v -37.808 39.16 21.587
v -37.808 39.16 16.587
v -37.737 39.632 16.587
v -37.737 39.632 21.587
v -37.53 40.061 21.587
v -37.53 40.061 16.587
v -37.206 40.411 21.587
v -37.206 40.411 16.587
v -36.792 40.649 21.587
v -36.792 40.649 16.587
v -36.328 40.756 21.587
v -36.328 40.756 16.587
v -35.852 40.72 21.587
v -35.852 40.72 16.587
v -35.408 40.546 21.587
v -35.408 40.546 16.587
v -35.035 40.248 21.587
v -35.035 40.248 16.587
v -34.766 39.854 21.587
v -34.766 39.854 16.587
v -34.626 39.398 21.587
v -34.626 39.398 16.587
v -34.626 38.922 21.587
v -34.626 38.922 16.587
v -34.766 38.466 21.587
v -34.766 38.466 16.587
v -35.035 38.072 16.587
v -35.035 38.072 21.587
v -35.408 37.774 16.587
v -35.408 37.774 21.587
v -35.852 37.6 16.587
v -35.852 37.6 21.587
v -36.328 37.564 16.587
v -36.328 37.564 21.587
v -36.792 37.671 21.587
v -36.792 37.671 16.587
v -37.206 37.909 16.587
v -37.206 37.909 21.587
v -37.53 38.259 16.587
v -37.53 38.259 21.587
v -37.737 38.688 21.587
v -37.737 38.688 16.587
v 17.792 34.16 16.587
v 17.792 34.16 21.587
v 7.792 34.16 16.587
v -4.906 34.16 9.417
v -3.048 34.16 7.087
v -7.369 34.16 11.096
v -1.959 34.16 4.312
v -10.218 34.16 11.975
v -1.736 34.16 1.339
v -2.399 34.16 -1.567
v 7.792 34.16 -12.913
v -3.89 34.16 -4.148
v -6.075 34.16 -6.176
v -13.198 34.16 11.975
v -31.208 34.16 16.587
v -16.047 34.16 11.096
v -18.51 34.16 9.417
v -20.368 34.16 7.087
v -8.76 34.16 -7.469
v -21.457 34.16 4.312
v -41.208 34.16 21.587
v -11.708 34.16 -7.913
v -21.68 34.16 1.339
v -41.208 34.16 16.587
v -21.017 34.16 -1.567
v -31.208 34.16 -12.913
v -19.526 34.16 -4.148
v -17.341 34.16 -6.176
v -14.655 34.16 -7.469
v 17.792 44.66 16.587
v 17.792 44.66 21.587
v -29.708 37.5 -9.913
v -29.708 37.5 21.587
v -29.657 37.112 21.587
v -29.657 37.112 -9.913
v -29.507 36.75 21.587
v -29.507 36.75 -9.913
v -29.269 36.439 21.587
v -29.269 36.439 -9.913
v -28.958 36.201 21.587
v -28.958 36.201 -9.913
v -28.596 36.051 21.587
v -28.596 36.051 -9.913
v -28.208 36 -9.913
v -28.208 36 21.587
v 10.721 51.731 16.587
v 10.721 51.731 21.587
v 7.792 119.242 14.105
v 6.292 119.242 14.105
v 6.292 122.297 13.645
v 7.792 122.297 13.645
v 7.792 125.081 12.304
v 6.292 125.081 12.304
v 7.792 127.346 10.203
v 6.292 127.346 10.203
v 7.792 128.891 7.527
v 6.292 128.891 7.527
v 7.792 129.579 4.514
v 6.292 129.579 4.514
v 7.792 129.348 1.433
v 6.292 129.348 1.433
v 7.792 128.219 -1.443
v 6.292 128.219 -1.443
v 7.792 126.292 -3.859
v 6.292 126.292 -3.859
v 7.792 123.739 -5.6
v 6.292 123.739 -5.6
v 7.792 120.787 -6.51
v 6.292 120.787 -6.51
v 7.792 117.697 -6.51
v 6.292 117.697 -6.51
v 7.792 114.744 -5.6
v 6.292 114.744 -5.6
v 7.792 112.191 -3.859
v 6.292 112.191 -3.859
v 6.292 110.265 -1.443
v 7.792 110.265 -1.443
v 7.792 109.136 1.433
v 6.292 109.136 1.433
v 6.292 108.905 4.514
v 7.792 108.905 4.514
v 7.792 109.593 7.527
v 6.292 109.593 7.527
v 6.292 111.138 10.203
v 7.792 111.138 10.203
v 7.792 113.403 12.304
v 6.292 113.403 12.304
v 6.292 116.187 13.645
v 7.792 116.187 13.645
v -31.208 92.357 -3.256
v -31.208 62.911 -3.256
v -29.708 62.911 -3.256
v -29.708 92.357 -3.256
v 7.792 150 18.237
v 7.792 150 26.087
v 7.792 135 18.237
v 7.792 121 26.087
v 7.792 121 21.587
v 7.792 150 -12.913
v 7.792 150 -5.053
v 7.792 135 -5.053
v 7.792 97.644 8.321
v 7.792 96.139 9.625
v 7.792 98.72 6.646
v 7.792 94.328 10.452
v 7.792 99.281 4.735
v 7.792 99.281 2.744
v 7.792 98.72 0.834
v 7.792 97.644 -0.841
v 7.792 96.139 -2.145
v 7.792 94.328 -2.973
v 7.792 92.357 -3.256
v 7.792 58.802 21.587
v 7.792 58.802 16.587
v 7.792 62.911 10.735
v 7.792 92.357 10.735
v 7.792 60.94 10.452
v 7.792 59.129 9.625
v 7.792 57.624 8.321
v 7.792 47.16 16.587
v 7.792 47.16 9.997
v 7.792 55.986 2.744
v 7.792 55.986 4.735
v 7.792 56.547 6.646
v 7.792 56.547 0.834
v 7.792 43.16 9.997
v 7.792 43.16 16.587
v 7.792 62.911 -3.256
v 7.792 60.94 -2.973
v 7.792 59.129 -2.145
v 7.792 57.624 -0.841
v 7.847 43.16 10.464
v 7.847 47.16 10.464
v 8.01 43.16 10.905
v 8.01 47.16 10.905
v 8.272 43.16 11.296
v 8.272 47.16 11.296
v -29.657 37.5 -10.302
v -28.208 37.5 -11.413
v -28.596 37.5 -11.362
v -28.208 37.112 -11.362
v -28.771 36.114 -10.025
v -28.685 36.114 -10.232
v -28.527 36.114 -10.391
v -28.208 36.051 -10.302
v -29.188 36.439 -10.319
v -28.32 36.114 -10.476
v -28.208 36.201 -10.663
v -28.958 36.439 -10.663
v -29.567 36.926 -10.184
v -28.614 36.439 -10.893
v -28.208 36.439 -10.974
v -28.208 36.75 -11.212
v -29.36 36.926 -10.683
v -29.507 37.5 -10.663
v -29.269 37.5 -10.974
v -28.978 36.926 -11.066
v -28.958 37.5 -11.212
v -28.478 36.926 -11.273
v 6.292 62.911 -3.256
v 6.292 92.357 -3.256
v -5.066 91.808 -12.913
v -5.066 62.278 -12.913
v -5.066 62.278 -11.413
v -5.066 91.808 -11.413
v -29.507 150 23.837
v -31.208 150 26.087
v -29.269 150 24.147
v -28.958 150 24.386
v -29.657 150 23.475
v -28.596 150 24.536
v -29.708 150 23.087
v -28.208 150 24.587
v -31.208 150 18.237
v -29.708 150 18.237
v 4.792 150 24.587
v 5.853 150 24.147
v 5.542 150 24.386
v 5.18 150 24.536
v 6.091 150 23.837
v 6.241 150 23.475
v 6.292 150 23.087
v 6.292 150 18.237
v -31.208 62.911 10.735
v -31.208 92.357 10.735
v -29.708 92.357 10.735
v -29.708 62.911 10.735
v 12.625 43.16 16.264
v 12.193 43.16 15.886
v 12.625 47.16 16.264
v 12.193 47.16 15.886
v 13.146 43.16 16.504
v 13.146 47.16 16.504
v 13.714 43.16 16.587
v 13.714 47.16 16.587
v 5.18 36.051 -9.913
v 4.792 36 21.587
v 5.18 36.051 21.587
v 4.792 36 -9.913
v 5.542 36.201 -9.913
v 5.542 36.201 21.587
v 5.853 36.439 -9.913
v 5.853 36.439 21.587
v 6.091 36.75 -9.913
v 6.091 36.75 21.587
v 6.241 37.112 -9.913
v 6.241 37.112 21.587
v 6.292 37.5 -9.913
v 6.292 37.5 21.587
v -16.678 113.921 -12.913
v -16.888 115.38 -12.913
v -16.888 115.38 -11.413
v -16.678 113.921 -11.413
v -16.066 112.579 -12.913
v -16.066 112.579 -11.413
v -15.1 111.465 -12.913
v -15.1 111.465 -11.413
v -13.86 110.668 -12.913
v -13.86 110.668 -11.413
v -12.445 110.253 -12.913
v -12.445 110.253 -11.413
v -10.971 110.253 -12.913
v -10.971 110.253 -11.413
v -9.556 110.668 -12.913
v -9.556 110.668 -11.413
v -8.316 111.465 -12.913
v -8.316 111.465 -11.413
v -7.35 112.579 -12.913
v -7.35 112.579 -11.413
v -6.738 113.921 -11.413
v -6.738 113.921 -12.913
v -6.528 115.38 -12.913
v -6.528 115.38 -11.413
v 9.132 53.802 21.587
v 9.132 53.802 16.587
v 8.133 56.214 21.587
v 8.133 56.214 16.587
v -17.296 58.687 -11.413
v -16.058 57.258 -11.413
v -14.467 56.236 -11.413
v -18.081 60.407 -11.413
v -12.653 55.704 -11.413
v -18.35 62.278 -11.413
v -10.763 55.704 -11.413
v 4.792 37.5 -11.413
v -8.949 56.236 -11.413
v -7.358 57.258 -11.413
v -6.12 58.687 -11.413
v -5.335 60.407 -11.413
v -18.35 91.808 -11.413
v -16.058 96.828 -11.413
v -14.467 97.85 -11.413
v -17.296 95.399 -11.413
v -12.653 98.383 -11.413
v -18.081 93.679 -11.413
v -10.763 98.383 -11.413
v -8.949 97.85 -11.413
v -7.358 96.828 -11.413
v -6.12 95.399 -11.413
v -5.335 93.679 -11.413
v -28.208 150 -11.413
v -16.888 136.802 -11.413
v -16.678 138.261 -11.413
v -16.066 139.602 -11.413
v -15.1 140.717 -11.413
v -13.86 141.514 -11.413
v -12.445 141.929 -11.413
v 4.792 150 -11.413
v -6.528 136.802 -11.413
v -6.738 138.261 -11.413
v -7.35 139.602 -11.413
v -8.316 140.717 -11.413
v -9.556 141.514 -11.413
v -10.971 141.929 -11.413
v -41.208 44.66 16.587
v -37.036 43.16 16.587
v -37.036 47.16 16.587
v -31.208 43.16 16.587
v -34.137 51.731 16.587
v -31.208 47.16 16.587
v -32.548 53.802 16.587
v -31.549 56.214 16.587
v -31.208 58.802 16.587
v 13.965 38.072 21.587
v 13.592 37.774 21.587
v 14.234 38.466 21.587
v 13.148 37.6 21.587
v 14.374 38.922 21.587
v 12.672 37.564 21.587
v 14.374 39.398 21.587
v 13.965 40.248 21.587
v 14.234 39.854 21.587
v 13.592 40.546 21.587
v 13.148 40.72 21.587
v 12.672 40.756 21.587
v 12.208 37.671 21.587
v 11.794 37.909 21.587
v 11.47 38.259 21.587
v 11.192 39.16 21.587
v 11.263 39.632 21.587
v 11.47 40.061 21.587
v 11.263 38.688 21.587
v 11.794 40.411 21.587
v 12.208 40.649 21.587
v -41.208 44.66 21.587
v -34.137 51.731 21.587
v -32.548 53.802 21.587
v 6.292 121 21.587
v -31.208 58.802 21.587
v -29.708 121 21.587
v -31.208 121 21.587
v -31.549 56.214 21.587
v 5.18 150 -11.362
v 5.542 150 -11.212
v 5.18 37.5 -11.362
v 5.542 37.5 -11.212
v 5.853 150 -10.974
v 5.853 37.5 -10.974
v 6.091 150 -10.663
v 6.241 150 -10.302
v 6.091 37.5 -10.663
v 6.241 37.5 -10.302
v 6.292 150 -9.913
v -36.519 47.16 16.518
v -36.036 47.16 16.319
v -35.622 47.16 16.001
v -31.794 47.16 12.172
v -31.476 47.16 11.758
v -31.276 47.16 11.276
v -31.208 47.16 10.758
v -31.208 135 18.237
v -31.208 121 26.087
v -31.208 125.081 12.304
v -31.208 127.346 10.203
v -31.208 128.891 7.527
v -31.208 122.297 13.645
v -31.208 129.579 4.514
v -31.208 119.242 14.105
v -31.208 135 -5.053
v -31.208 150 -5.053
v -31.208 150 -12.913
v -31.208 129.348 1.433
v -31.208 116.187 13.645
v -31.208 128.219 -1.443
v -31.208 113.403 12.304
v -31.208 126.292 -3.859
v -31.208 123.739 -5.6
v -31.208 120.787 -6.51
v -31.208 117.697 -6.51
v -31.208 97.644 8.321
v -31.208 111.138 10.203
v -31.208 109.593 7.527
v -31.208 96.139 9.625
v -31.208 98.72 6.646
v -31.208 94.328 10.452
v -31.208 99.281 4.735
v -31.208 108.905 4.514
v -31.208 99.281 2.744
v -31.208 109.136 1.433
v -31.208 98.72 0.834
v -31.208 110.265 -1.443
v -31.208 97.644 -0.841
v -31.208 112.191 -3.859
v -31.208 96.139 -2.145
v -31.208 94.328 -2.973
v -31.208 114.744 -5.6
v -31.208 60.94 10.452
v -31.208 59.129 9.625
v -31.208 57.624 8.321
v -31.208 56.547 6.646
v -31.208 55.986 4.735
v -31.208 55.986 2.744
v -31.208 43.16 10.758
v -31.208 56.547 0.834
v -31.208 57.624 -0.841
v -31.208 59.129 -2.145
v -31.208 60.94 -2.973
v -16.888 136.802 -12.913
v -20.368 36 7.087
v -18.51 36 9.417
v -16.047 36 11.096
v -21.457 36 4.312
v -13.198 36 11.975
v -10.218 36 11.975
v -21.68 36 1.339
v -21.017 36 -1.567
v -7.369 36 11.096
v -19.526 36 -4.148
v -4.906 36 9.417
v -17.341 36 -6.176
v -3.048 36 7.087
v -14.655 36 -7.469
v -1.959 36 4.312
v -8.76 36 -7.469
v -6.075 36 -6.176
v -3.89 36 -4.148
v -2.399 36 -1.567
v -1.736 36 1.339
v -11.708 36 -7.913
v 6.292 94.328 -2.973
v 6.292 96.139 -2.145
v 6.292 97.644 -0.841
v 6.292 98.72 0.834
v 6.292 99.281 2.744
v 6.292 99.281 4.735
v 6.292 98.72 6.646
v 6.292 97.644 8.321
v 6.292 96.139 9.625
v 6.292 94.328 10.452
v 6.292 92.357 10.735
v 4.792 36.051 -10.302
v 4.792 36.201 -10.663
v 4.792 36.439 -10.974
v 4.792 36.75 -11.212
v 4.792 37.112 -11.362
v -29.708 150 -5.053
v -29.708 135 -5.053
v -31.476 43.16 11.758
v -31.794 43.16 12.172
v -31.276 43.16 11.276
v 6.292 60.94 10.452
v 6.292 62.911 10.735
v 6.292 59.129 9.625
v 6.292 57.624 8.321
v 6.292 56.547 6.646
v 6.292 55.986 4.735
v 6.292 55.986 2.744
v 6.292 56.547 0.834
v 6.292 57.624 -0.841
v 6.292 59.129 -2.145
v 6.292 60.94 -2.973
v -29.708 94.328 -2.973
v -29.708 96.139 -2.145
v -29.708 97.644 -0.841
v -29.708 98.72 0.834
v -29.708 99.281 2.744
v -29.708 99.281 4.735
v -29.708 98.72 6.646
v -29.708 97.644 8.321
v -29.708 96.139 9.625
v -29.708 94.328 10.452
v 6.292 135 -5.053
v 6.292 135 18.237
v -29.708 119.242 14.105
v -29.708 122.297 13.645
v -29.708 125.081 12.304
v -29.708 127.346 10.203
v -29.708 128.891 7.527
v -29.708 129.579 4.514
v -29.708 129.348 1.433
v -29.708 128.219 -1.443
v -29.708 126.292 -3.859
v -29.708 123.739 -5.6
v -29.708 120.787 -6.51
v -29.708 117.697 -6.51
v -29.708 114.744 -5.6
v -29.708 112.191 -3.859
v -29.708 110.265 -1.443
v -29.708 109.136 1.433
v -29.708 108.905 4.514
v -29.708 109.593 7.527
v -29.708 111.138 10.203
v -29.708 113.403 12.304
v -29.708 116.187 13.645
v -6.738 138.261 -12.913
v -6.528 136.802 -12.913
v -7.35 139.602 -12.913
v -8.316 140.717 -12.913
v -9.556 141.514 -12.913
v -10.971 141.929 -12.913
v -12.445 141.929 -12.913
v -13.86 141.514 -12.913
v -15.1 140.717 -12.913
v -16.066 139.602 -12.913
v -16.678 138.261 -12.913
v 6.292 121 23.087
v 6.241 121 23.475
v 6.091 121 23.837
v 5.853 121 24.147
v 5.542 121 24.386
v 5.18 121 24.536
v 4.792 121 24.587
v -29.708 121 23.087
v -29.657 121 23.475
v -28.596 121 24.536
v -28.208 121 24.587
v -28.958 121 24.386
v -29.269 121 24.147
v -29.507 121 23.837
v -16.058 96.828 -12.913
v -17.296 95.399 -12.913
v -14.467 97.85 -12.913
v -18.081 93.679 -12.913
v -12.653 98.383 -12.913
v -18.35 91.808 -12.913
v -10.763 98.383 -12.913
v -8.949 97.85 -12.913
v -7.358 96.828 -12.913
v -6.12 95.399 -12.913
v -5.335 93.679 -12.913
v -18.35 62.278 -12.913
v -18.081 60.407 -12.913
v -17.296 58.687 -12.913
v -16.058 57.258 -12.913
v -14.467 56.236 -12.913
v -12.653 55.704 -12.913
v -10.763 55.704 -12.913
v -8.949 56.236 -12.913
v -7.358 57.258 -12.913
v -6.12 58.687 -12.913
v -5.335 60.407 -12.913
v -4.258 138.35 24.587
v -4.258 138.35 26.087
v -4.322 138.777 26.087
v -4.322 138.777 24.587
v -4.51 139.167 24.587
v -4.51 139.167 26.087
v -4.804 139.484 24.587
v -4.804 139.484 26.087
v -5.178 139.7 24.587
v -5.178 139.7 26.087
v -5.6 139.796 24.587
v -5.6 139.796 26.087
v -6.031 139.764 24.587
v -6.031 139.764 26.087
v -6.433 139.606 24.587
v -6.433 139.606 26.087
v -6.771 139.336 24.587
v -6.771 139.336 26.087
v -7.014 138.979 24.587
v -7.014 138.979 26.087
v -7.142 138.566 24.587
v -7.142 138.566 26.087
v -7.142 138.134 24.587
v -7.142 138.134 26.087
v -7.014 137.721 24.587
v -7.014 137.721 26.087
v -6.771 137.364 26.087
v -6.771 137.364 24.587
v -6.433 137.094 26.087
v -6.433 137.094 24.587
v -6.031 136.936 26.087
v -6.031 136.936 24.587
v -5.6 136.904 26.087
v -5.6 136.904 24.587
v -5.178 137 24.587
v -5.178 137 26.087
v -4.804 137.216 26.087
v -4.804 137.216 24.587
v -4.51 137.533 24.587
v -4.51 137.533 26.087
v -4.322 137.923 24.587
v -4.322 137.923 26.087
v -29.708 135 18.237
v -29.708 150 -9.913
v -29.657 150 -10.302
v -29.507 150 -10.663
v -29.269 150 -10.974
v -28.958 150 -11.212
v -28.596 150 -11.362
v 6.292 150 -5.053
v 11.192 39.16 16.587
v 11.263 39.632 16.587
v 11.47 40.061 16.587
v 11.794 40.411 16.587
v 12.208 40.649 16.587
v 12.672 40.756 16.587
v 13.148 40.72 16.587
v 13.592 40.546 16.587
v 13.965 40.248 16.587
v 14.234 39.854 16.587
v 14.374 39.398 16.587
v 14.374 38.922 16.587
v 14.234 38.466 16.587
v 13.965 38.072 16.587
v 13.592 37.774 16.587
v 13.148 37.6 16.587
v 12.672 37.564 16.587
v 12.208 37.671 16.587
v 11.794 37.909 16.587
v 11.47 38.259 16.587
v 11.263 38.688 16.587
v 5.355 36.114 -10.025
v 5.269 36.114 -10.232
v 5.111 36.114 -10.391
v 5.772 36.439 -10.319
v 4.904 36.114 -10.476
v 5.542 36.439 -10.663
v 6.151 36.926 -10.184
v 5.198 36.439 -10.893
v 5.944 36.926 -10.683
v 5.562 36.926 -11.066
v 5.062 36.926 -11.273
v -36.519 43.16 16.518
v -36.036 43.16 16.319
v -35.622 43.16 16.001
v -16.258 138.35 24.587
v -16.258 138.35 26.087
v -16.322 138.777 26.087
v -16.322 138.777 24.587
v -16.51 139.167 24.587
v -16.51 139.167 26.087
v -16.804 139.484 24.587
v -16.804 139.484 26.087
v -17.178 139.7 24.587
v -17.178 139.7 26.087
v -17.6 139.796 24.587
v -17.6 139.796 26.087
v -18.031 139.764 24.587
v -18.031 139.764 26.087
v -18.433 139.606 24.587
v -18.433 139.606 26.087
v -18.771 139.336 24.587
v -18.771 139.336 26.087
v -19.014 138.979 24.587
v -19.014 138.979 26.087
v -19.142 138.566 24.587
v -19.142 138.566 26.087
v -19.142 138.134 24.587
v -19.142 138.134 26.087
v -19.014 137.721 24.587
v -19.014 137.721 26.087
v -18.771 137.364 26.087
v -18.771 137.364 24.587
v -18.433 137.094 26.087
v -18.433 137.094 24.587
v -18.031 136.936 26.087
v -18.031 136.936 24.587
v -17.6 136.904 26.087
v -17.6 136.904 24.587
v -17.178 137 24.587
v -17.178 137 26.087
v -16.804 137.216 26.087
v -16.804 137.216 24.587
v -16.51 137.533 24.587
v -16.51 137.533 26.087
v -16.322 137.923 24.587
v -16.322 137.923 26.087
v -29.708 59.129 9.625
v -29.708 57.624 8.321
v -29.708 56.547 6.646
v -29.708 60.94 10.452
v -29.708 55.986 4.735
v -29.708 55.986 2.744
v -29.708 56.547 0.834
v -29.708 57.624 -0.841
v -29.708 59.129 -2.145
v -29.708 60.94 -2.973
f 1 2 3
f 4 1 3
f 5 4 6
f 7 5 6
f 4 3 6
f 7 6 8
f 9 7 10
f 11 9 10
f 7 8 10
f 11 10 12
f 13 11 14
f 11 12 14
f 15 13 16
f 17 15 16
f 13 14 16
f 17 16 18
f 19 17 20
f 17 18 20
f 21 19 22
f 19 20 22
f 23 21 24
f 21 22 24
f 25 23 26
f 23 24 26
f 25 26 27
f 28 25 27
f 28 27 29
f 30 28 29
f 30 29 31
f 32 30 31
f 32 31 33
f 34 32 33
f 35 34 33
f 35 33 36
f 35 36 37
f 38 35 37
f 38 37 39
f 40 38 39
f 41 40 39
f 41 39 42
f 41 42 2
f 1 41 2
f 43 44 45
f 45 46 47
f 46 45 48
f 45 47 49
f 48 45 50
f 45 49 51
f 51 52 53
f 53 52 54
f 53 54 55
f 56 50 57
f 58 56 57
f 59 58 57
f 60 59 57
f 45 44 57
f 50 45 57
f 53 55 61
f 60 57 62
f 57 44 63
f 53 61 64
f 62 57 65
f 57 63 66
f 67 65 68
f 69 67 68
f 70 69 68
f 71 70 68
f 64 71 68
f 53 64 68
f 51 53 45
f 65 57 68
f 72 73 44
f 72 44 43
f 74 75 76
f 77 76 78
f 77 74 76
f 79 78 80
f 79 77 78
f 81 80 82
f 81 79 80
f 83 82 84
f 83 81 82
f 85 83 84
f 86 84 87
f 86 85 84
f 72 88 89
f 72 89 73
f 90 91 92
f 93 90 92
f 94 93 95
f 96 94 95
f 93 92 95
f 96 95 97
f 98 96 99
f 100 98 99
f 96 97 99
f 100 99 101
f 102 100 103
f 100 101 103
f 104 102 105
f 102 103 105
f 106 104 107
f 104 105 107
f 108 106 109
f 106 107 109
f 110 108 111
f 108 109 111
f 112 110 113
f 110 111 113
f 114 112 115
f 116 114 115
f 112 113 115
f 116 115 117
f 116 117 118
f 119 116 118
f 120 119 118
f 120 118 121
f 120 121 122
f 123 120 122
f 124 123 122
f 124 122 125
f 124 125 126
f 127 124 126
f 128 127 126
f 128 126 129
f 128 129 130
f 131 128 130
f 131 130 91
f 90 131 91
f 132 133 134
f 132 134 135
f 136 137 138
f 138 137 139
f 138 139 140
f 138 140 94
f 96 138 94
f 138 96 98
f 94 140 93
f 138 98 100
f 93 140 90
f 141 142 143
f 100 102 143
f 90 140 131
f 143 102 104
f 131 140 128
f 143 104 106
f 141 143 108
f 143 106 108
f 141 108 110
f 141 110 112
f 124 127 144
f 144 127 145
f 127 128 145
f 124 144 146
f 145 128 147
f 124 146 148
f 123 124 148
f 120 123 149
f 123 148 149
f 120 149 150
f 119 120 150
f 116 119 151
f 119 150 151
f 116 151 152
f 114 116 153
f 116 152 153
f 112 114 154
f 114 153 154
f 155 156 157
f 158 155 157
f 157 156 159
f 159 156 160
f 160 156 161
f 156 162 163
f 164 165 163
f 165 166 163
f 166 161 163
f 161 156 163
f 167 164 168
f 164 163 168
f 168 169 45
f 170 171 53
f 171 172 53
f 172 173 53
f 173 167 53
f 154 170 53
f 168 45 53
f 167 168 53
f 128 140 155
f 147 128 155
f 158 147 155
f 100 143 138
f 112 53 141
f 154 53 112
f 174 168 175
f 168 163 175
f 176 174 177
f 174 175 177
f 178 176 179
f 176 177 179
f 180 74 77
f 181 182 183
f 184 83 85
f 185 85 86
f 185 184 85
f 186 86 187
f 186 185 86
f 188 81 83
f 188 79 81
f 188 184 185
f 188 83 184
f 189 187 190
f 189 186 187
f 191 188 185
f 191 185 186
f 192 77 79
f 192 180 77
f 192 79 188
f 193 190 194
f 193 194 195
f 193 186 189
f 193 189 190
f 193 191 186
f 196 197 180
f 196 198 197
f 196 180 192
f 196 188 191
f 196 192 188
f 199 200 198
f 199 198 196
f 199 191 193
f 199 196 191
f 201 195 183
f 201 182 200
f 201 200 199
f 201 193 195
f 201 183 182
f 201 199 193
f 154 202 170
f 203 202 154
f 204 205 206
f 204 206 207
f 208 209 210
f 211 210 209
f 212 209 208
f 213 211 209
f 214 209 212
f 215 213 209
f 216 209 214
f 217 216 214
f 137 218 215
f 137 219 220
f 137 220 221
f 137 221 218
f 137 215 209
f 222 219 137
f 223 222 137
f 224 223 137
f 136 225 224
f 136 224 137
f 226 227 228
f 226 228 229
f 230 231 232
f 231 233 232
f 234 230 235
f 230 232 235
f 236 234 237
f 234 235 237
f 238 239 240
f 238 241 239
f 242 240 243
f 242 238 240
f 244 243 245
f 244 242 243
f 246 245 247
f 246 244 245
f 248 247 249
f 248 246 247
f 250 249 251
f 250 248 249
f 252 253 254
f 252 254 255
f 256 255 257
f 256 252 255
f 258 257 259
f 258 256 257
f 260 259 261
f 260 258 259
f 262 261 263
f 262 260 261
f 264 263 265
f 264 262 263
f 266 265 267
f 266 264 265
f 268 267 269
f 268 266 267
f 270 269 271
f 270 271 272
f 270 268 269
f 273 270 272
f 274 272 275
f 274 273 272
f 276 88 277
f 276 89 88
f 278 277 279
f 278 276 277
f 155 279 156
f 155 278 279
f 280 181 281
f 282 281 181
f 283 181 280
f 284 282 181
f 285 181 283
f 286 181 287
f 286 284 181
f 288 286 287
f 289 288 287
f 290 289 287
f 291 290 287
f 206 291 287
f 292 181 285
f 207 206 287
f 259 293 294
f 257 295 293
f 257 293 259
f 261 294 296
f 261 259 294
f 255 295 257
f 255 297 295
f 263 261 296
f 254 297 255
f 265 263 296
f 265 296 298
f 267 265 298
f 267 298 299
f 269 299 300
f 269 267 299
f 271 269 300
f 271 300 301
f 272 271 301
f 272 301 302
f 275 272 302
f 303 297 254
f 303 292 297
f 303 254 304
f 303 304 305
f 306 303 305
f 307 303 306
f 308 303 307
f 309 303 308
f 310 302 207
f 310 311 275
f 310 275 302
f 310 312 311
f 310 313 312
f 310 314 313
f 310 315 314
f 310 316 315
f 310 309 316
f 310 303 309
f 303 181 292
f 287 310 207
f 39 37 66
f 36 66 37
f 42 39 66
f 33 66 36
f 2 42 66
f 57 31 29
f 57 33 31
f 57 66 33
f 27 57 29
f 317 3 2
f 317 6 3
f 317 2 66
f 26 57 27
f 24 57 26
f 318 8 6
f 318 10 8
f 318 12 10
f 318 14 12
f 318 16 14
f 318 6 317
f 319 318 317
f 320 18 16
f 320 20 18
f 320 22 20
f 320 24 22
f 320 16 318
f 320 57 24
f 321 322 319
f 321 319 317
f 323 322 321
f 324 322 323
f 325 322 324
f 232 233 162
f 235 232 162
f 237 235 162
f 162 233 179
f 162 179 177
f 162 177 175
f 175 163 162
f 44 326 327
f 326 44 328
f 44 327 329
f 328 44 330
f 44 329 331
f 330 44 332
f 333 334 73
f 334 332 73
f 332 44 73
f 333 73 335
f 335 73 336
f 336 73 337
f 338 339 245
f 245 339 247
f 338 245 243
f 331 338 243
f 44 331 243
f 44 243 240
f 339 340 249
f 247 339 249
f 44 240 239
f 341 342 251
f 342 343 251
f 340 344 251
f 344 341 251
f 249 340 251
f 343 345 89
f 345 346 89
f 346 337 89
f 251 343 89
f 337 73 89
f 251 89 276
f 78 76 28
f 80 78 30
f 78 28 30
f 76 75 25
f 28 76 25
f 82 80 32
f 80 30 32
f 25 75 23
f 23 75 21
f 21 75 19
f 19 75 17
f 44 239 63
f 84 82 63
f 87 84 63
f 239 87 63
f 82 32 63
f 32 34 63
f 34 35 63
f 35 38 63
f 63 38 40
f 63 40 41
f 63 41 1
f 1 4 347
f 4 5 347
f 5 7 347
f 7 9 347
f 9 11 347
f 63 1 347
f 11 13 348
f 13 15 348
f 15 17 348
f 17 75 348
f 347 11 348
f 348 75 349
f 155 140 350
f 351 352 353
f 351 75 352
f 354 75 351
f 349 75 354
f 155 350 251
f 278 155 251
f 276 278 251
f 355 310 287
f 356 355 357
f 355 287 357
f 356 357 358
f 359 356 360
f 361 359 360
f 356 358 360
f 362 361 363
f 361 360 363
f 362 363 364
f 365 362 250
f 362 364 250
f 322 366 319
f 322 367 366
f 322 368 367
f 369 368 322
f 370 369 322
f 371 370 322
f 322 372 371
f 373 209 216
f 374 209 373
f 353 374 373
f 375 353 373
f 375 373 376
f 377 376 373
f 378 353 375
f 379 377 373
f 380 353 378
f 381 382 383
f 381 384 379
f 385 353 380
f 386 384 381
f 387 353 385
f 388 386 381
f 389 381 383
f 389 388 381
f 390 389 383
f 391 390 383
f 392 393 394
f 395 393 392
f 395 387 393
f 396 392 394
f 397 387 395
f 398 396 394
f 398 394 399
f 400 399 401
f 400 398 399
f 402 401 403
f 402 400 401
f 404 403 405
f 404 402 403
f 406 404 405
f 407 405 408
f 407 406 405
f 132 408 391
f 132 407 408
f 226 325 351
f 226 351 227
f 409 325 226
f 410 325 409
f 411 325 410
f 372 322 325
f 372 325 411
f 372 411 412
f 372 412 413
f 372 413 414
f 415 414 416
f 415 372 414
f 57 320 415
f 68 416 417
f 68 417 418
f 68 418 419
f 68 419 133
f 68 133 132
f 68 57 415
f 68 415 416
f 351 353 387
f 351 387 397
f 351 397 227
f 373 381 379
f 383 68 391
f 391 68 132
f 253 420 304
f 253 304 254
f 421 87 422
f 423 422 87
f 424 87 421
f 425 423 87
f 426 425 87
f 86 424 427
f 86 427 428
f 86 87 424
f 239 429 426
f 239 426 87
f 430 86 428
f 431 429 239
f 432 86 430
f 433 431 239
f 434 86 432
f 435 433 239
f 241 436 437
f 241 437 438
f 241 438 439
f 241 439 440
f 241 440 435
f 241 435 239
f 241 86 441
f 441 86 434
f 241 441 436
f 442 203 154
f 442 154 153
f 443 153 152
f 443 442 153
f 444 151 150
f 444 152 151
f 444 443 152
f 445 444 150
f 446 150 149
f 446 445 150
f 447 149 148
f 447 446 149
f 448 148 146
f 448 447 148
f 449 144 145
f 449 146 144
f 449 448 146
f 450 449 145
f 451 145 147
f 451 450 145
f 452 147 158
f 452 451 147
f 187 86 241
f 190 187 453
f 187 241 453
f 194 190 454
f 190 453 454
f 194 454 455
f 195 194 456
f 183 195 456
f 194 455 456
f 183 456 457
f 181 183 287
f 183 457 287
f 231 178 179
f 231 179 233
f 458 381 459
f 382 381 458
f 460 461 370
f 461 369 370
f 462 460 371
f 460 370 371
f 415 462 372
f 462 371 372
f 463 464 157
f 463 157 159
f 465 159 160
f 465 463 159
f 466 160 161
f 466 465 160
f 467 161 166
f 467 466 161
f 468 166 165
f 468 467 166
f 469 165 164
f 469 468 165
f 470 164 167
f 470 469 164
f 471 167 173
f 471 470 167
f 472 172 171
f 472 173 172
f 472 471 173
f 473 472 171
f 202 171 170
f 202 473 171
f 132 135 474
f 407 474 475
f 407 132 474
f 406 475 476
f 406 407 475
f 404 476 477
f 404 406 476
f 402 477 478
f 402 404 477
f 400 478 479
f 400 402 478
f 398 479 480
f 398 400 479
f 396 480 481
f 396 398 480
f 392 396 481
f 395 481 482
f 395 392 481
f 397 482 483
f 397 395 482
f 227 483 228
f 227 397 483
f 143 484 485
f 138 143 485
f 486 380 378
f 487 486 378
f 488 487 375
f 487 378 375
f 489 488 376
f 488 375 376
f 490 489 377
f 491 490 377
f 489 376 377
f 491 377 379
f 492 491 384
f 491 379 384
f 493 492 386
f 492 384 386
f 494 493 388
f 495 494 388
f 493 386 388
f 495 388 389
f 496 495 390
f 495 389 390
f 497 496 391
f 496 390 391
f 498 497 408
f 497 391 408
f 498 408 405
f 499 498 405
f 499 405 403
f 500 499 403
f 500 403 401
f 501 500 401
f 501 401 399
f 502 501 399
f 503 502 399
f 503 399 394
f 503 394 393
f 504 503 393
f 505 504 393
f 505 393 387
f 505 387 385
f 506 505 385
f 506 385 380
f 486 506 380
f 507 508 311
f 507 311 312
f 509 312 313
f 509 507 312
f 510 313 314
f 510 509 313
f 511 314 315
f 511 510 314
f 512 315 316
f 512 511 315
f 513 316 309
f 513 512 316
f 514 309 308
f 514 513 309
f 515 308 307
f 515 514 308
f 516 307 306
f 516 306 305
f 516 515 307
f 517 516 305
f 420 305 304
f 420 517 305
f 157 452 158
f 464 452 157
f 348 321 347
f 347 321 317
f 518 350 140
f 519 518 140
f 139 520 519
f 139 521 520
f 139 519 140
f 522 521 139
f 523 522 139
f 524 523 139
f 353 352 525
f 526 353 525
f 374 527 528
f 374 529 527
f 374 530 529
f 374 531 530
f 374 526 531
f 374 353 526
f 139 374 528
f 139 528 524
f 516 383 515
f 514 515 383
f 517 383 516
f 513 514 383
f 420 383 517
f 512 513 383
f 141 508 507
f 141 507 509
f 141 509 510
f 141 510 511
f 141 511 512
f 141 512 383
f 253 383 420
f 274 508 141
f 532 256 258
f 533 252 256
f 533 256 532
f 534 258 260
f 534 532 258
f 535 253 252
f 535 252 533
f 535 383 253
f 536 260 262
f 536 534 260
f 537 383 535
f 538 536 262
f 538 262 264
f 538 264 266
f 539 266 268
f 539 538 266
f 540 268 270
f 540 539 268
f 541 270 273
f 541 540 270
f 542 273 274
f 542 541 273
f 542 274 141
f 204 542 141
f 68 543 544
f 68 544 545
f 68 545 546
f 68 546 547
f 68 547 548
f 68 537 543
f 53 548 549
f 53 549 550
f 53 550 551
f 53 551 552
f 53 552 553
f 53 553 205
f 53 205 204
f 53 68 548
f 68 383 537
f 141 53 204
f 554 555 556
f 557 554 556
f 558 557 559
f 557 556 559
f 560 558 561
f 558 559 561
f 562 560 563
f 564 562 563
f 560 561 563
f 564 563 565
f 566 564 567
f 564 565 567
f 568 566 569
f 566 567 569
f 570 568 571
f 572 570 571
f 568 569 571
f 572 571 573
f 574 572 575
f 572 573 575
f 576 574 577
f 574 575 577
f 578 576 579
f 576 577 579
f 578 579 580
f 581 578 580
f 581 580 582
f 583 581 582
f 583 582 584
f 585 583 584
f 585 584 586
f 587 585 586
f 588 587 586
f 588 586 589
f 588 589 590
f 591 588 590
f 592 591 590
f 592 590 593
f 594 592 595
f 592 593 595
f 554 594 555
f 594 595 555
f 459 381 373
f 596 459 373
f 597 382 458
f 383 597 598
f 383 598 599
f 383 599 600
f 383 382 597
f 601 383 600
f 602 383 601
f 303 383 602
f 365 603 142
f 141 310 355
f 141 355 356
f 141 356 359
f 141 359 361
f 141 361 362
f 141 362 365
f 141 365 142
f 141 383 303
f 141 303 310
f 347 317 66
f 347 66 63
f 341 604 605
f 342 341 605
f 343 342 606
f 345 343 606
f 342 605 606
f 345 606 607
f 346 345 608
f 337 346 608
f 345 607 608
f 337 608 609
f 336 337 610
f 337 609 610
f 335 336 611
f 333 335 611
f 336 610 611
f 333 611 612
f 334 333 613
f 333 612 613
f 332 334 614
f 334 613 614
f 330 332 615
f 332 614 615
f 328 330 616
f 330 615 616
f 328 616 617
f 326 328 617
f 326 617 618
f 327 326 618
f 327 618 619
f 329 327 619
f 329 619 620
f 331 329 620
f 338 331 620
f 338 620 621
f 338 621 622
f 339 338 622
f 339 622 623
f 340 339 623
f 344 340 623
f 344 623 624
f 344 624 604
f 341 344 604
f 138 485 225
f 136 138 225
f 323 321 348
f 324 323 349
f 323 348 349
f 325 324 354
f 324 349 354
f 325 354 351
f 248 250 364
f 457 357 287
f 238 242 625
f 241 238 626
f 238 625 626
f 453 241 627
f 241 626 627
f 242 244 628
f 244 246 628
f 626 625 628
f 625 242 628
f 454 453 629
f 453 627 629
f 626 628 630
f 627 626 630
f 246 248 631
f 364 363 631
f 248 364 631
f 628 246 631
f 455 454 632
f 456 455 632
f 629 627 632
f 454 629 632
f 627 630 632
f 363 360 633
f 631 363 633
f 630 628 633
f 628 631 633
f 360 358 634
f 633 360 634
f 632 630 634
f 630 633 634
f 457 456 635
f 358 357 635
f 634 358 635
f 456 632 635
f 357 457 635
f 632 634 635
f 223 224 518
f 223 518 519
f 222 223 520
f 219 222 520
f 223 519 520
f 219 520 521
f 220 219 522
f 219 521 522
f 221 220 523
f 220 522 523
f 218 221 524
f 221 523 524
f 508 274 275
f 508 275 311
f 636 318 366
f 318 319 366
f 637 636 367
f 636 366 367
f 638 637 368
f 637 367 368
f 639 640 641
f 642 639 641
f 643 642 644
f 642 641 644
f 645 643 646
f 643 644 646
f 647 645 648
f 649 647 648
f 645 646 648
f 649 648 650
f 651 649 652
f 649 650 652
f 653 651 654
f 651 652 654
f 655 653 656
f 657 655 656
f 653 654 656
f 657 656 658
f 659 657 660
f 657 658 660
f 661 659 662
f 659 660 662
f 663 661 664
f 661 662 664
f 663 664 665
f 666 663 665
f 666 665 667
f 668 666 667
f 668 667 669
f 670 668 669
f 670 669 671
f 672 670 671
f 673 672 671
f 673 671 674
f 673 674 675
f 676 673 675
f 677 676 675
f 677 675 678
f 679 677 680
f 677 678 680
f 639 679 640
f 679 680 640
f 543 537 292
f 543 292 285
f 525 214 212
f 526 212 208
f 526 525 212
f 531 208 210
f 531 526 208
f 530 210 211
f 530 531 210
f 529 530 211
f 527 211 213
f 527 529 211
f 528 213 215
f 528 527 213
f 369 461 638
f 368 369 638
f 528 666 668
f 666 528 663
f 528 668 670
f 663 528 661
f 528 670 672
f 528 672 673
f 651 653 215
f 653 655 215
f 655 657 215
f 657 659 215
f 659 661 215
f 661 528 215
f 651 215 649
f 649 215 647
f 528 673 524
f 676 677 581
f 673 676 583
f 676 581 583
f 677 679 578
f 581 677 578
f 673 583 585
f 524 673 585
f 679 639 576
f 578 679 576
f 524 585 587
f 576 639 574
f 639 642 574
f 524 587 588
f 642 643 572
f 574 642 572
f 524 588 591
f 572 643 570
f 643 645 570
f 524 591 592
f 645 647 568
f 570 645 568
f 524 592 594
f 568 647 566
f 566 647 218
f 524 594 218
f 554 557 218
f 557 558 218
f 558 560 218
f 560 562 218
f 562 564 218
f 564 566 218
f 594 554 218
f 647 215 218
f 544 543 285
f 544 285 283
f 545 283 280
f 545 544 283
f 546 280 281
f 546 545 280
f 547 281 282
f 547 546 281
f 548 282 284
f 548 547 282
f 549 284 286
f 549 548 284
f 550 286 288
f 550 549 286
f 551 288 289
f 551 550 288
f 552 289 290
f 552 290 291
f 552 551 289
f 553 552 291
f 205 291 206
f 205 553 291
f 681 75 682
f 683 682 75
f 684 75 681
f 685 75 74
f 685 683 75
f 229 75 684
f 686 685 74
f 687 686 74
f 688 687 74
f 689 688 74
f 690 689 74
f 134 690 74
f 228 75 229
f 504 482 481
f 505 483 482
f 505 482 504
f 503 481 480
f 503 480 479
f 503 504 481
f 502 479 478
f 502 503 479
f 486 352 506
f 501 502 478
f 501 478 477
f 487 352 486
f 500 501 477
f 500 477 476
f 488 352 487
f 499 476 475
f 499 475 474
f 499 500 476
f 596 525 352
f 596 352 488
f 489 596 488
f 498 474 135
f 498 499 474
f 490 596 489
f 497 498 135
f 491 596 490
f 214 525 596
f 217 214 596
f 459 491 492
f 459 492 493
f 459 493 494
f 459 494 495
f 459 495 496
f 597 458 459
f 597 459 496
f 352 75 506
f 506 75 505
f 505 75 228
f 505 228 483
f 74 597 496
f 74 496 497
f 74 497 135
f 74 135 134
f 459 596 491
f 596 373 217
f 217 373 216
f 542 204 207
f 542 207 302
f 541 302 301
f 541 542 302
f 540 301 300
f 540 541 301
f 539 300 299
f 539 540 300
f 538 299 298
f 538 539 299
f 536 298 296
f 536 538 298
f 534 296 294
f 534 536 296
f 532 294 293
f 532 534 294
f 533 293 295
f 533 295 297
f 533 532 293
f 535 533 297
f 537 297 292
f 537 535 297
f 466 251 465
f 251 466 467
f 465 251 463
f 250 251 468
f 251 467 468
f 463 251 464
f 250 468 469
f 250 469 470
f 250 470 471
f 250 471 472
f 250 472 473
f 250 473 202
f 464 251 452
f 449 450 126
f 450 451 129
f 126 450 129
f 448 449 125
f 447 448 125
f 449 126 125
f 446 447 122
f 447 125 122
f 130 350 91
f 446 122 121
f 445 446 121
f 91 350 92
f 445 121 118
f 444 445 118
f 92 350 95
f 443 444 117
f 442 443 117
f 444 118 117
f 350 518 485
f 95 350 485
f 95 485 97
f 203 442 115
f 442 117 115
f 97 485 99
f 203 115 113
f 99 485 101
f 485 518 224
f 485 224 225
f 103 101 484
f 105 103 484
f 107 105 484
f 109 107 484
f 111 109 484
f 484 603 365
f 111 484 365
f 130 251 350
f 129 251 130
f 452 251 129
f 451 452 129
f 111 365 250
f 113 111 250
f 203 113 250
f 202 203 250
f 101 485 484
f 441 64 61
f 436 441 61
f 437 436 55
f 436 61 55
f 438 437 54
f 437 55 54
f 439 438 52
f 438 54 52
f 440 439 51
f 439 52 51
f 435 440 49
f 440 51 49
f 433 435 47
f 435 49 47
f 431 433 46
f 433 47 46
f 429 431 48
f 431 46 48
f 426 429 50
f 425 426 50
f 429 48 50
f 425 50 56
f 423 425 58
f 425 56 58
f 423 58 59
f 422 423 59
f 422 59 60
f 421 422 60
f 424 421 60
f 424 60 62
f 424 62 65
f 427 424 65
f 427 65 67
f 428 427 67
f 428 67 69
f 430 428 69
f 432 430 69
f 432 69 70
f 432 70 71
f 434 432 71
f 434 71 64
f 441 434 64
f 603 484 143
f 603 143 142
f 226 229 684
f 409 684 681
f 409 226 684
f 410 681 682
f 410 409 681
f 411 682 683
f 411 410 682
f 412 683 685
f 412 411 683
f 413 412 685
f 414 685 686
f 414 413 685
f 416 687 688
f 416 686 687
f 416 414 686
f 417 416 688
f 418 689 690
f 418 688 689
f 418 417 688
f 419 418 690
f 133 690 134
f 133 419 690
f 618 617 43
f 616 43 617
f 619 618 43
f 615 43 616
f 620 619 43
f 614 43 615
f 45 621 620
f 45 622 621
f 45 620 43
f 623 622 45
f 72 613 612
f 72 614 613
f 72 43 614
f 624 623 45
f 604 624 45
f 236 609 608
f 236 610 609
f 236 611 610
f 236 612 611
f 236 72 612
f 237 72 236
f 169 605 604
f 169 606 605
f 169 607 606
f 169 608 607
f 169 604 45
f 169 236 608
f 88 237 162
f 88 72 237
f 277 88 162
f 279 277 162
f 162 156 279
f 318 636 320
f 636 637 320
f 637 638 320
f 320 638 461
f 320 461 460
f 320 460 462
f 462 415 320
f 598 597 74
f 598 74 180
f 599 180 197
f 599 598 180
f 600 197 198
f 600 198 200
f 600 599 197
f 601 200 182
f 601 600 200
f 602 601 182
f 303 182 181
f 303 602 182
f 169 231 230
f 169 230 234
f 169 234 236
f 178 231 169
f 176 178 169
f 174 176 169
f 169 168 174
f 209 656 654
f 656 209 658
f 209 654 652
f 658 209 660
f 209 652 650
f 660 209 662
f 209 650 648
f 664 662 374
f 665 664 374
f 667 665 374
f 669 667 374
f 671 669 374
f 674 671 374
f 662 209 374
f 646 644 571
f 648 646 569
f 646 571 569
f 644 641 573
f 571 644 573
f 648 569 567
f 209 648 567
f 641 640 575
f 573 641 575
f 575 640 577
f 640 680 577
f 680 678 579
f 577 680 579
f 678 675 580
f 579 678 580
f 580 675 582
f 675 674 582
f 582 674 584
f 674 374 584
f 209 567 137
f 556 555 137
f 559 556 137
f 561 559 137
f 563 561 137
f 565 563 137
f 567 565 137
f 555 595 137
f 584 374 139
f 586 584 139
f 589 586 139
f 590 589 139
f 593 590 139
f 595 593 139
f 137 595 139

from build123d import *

# Parameters (mm, degrees)
SKETCH1_W       = 39
SKETCH1_H       = 39
EXTRUDE1_DEPTH  = 150
SKETCH2_W       = 36
SKETCH2_H       = 36
EXTRUDE2_DEPTH  = 112
SKETCH3_W       = 4.5
SKETCH3_H       = 120
EXTRUDE3_DEPTH  = 158.167148993
SKETCH8_W       = 36
SKETCH8_H       = 33
EXTRUDE6_DEPTH  = 2
FILLET1_R       = 1.5
SKETCH11_W      = 23.29
SKETCH11_H      = 15
EXTRUDE8_DEPTH  = 158.167148993
EXTRUDE9_DEPTH  = 1.5
SKETCH14_R      = 1.45
EXTRUDE11_DEPTH = 1.5
SKETCH15_R      = 10.365721684
EXTRUDE12_DEPTH = 158.167148993
SKETCH17_W      = 4.5
SKETCH17_H      = 1
EXTRUDE14_DEPTH = 158.167148993
SKETCH18_W      = 34.5
SKETCH18_H      = 34.16
EXTRUDE15_DEPTH = 158.167148993
SKETCH19_W      = 5
SKETCH19_H      = 10.5
EXTRUDE16_DEPTH = 10
SKETCH20_W      = 5
SKETCH20_H      = 10.5
EXTRUDE17_DEPTH = 10
SKETCH21_R      = 1.6
EXTRUDE18_DEPTH = 10
SKETCH22_R      = 1.6
EXTRUDE19_DEPTH = 10
EXTRUDE20_DEPTH = 5
SKETCH25_R      = 10
EXTRUDE21_DEPTH = 5
EXTRUDE23_DEPTH = 4
FILLET2_R       = 10
FILLET3_R       = 2


with BuildPart() as part:
    # Sketch1 → Extrude1 (new body)
    with BuildSketch(Plane(origin=(0, 0, 0), x_dir=(1, 0, 0), z_dir=(0, 1, 0))):
        with Locations((-11.707942094, -6.586638776)):
            Rectangle(SKETCH1_W, SKETCH1_H)
    extrude(amount=EXTRUDE1_DEPTH)

    # Sketch2 → Extrude2 (cut)
    with BuildSketch(Plane(origin=(0, 150, 0), x_dir=(1, 0, 0), z_dir=(0, 1, 0))):
        with Locations((-11.707942094, -6.586638776)):
            Rectangle(SKETCH2_W, SKETCH2_H)
    extrude(amount=-EXTRUDE2_DEPTH, mode=Mode.SUBTRACT)

    # Sketch3 → Extrude3 (cut, through all)
    with BuildSketch(Plane.ZY.offset(31.207942094)):
        with Locations((23.836638776, 60)):
            Rectangle(SKETCH3_W, SKETCH3_H)
    extrude(amount=-EXTRUDE3_DEPTH, mode=Mode.SUBTRACT)

    # Sketch8 → Extrude6 (cut)
    with BuildSketch(Plane(origin=(0, 38, 0), x_dir=(1, 0, 0), z_dir=(0, 1, 0))):
        with Locations((-11.707942094, -5.086638776)):
            Rectangle(SKETCH8_W, SKETCH8_H)
    extrude(amount=-EXTRUDE6_DEPTH, mode=Mode.SUBTRACT)

    # Fillet1
    fillet1_edges = [part.edges().sort_by_distance(p)[0] for p in [
        (-29.707942094, 93, -11.413361224),
        (6.292057906, 93, -11.413361224),
        (6.292057906, 135, 24.586638776),
        (-29.707942094, 135, 24.586638776),
        (6.292057906, 36, 5.086638776),
        (-29.707942094, 36, 5.086638776),
        (-11.707942094, 36, -11.413361224),
    ]]
    fillet(fillet1_edges, radius=FILLET1_R)

    # Sketch11 → Extrude8 (cut, through all)
    with BuildSketch(Plane.ZY.offset(31.207942094)):
        with BuildLine():
            Line((-3.255937041, 62.910708566), (-3.255937041, 92.357092416))
            ThreePointArc((-3.255937041, 92.357092416), (3.739612713, 99.352642171), (10.735162468, 92.357092416))
            Line((10.735162468, 92.357092416), (10.735162468, 62.910708566))
            ThreePointArc((10.735162468, 62.910708566), (3.739612713, 55.915158812), (-3.255937041, 62.910708566))
        make_face()
        with Locations((6.591638776, 142.5)):
            Rectangle(SKETCH11_W, SKETCH11_H)
    extrude(amount=-EXTRUDE8_DEPTH, mode=Mode.SUBTRACT)

    # Sketch12 → Extrude9 (cut)
    with BuildSketch(Plane(origin=(0, 0, -12.913361224), x_dir=(-1, 0, 0), z_dir=(0, 0, -1))):
        with BuildLine():
            Line((5.065703237, 62.27828297), (5.065703237, 91.808021534))
            ThreePointArc((5.065703237, 91.808021534), (11.707942094, 98.450260391), (18.350180951, 91.808021534))
            Line((18.350180951, 91.808021534), (18.350180951, 62.27828297))
            ThreePointArc((18.350180951, 62.27828297), (11.707942094, 55.636044113), (5.065703237, 62.27828297))
        make_face()
        with BuildLine():
            Line((6.527758749, 115.3801061), (6.527758749, 136.80161472))
            ThreePointArc((6.527758749, 136.80161472), (11.707942094, 141.981798065), (16.888125439, 136.80161472))
            Line((16.888125439, 136.80161472), (16.888125439, 115.3801061))
            ThreePointArc((16.888125439, 115.3801061), (11.707942094, 110.199922755), (6.527758749, 115.3801061))
        make_face()
    extrude(amount=-EXTRUDE9_DEPTH, mode=Mode.SUBTRACT)

    # Sketch14 → Extrude11 (cut)
    with BuildSketch(Plane.XY.offset(26.086638776)):
        with Locations((-5.707942094, 138.35)):
            Circle(SKETCH14_R)
        with Locations((-17.707942094, 138.35)):
            Circle(SKETCH14_R)
    extrude(amount=-EXTRUDE11_DEPTH, mode=Mode.SUBTRACT)

    # Sketch15 → Extrude12 (cut, through all)
    with BuildSketch(Plane.ZY.offset(31.207942094)):
        with Locations((3.739612713, 119.241924714)):
            Circle(SKETCH15_R)
    extrude(amount=-EXTRUDE12_DEPTH, mode=Mode.SUBTRACT)

    # Sketch17 → Extrude14 (cut, through all)
    with BuildSketch(Plane.ZY.offset(31.207942094)):
        with Locations((23.836638776, 120.5)):
            Rectangle(SKETCH17_W, SKETCH17_H)
    extrude(amount=-EXTRUDE14_DEPTH, mode=Mode.SUBTRACT)

    # Sketch18 → Extrude15 (cut, through all)
    with BuildSketch(Plane.ZY.offset(31.207942094)):
        with Locations((4.336638776, 17.08)):
            Rectangle(SKETCH18_W, SKETCH18_H)
    extrude(amount=-EXTRUDE15_DEPTH, mode=Mode.SUBTRACT)

    # Sketch19 → Extrude16 (add)
    with BuildSketch(Plane.ZY.offset(31.207942094)):
        with Locations((19.086638776, 39.41)):
            Rectangle(SKETCH19_W, SKETCH19_H)
    extrude(amount=EXTRUDE16_DEPTH)

    # Sketch20 → Extrude17 (add)
    with BuildSketch(Plane(origin=(7.792057906, 0, 0), x_dir=(0, 0, -1), z_dir=(1, 0, 0))):
        with Locations((-19.086638776, 39.41)):
            Rectangle(SKETCH20_W, SKETCH20_H)
    extrude(amount=EXTRUDE17_DEPTH)

    # Sketch21 → Extrude18 (cut)
    with BuildSketch(Plane(origin=(0, 0, 16.586638776), x_dir=(-1, 0, 0), z_dir=(0, 0, -1))):
        with Locations((-12.792057906, 39.16)):
            Circle(SKETCH21_R)
    extrude(amount=-EXTRUDE18_DEPTH, mode=Mode.SUBTRACT)

    # Sketch22 → Extrude19 (cut)
    with BuildSketch(Plane(origin=(0, 0, 16.586638776), x_dir=(-1, 0, 0), z_dir=(0, 0, -1))):
        with Locations((36.207942094, 39.16)):
            Circle(SKETCH22_R)
    extrude(amount=-EXTRUDE19_DEPTH, mode=Mode.SUBTRACT)

    # Sketch24 → Extrude20 (add)
    with BuildSketch(Plane(origin=(0, 0, 16.586638776), x_dir=(-1, 0, 0), z_dir=(0, 0, -1))):
        Polygon((-17.792057906, 44.66), (-7.792057906, 44.66), (-7.792057906, 54.66), align=None)
        Polygon((41.207942094, 44.66), (31.207942094, 44.66), (31.207942094, 54.66), align=None)
    extrude(amount=-EXTRUDE20_DEPTH)

    # Sketch25 → Extrude21 (cut)
    with BuildSketch(Plane(origin=(0, 34.16, 0), x_dir=(-1, 0, 0), z_dir=(0, -1, 0))):
        with Locations(Location((11.707942094, -2.086638776, 0), (0, 0, 90))):
            Circle(SKETCH25_R)
    extrude(amount=-EXTRUDE21_DEPTH, mode=Mode.SUBTRACT)

    # Sketch31 → Extrude23 (add)
    with BuildSketch(Plane(origin=(0, 43.16, 0), x_dir=(-1, 0, 0), z_dir=(0, -1, 0))):
        Polygon((-12.792057906, -16.586638776), (-7.792057906, -16.586638776), (-7.792057906, -10.735162468), align=None)
        Polygon((36.207942094, -16.586638776), (31.207942094, -16.586638776), (31.207942094, -11.586638776), align=None)
    extrude(amount=-EXTRUDE23_DEPTH)

    # Fillet2
    fillet2_edges = [part.edges().sort_by_distance(p)[0] for p in [
        (7.792057906, 54.66, 19.086638776),
        (-31.207942094, 54.66, 19.086638776),
    ]]
    fillet(fillet2_edges, radius=FILLET2_R)

    # Fillet3
    fillet3_edges = [part.edges().sort_by_distance(p)[0] for p in [
        (7.792057906, 45.16, 10.735162468),
        (12.792057906, 45.16, 16.586638776),
        (-31.207942094, 45.16, 11.586638776),
        (-36.207942094, 45.16, 16.586638776),
    ]]
    fillet(fillet3_edges, radius=FILLET3_R)


solid = part.part
